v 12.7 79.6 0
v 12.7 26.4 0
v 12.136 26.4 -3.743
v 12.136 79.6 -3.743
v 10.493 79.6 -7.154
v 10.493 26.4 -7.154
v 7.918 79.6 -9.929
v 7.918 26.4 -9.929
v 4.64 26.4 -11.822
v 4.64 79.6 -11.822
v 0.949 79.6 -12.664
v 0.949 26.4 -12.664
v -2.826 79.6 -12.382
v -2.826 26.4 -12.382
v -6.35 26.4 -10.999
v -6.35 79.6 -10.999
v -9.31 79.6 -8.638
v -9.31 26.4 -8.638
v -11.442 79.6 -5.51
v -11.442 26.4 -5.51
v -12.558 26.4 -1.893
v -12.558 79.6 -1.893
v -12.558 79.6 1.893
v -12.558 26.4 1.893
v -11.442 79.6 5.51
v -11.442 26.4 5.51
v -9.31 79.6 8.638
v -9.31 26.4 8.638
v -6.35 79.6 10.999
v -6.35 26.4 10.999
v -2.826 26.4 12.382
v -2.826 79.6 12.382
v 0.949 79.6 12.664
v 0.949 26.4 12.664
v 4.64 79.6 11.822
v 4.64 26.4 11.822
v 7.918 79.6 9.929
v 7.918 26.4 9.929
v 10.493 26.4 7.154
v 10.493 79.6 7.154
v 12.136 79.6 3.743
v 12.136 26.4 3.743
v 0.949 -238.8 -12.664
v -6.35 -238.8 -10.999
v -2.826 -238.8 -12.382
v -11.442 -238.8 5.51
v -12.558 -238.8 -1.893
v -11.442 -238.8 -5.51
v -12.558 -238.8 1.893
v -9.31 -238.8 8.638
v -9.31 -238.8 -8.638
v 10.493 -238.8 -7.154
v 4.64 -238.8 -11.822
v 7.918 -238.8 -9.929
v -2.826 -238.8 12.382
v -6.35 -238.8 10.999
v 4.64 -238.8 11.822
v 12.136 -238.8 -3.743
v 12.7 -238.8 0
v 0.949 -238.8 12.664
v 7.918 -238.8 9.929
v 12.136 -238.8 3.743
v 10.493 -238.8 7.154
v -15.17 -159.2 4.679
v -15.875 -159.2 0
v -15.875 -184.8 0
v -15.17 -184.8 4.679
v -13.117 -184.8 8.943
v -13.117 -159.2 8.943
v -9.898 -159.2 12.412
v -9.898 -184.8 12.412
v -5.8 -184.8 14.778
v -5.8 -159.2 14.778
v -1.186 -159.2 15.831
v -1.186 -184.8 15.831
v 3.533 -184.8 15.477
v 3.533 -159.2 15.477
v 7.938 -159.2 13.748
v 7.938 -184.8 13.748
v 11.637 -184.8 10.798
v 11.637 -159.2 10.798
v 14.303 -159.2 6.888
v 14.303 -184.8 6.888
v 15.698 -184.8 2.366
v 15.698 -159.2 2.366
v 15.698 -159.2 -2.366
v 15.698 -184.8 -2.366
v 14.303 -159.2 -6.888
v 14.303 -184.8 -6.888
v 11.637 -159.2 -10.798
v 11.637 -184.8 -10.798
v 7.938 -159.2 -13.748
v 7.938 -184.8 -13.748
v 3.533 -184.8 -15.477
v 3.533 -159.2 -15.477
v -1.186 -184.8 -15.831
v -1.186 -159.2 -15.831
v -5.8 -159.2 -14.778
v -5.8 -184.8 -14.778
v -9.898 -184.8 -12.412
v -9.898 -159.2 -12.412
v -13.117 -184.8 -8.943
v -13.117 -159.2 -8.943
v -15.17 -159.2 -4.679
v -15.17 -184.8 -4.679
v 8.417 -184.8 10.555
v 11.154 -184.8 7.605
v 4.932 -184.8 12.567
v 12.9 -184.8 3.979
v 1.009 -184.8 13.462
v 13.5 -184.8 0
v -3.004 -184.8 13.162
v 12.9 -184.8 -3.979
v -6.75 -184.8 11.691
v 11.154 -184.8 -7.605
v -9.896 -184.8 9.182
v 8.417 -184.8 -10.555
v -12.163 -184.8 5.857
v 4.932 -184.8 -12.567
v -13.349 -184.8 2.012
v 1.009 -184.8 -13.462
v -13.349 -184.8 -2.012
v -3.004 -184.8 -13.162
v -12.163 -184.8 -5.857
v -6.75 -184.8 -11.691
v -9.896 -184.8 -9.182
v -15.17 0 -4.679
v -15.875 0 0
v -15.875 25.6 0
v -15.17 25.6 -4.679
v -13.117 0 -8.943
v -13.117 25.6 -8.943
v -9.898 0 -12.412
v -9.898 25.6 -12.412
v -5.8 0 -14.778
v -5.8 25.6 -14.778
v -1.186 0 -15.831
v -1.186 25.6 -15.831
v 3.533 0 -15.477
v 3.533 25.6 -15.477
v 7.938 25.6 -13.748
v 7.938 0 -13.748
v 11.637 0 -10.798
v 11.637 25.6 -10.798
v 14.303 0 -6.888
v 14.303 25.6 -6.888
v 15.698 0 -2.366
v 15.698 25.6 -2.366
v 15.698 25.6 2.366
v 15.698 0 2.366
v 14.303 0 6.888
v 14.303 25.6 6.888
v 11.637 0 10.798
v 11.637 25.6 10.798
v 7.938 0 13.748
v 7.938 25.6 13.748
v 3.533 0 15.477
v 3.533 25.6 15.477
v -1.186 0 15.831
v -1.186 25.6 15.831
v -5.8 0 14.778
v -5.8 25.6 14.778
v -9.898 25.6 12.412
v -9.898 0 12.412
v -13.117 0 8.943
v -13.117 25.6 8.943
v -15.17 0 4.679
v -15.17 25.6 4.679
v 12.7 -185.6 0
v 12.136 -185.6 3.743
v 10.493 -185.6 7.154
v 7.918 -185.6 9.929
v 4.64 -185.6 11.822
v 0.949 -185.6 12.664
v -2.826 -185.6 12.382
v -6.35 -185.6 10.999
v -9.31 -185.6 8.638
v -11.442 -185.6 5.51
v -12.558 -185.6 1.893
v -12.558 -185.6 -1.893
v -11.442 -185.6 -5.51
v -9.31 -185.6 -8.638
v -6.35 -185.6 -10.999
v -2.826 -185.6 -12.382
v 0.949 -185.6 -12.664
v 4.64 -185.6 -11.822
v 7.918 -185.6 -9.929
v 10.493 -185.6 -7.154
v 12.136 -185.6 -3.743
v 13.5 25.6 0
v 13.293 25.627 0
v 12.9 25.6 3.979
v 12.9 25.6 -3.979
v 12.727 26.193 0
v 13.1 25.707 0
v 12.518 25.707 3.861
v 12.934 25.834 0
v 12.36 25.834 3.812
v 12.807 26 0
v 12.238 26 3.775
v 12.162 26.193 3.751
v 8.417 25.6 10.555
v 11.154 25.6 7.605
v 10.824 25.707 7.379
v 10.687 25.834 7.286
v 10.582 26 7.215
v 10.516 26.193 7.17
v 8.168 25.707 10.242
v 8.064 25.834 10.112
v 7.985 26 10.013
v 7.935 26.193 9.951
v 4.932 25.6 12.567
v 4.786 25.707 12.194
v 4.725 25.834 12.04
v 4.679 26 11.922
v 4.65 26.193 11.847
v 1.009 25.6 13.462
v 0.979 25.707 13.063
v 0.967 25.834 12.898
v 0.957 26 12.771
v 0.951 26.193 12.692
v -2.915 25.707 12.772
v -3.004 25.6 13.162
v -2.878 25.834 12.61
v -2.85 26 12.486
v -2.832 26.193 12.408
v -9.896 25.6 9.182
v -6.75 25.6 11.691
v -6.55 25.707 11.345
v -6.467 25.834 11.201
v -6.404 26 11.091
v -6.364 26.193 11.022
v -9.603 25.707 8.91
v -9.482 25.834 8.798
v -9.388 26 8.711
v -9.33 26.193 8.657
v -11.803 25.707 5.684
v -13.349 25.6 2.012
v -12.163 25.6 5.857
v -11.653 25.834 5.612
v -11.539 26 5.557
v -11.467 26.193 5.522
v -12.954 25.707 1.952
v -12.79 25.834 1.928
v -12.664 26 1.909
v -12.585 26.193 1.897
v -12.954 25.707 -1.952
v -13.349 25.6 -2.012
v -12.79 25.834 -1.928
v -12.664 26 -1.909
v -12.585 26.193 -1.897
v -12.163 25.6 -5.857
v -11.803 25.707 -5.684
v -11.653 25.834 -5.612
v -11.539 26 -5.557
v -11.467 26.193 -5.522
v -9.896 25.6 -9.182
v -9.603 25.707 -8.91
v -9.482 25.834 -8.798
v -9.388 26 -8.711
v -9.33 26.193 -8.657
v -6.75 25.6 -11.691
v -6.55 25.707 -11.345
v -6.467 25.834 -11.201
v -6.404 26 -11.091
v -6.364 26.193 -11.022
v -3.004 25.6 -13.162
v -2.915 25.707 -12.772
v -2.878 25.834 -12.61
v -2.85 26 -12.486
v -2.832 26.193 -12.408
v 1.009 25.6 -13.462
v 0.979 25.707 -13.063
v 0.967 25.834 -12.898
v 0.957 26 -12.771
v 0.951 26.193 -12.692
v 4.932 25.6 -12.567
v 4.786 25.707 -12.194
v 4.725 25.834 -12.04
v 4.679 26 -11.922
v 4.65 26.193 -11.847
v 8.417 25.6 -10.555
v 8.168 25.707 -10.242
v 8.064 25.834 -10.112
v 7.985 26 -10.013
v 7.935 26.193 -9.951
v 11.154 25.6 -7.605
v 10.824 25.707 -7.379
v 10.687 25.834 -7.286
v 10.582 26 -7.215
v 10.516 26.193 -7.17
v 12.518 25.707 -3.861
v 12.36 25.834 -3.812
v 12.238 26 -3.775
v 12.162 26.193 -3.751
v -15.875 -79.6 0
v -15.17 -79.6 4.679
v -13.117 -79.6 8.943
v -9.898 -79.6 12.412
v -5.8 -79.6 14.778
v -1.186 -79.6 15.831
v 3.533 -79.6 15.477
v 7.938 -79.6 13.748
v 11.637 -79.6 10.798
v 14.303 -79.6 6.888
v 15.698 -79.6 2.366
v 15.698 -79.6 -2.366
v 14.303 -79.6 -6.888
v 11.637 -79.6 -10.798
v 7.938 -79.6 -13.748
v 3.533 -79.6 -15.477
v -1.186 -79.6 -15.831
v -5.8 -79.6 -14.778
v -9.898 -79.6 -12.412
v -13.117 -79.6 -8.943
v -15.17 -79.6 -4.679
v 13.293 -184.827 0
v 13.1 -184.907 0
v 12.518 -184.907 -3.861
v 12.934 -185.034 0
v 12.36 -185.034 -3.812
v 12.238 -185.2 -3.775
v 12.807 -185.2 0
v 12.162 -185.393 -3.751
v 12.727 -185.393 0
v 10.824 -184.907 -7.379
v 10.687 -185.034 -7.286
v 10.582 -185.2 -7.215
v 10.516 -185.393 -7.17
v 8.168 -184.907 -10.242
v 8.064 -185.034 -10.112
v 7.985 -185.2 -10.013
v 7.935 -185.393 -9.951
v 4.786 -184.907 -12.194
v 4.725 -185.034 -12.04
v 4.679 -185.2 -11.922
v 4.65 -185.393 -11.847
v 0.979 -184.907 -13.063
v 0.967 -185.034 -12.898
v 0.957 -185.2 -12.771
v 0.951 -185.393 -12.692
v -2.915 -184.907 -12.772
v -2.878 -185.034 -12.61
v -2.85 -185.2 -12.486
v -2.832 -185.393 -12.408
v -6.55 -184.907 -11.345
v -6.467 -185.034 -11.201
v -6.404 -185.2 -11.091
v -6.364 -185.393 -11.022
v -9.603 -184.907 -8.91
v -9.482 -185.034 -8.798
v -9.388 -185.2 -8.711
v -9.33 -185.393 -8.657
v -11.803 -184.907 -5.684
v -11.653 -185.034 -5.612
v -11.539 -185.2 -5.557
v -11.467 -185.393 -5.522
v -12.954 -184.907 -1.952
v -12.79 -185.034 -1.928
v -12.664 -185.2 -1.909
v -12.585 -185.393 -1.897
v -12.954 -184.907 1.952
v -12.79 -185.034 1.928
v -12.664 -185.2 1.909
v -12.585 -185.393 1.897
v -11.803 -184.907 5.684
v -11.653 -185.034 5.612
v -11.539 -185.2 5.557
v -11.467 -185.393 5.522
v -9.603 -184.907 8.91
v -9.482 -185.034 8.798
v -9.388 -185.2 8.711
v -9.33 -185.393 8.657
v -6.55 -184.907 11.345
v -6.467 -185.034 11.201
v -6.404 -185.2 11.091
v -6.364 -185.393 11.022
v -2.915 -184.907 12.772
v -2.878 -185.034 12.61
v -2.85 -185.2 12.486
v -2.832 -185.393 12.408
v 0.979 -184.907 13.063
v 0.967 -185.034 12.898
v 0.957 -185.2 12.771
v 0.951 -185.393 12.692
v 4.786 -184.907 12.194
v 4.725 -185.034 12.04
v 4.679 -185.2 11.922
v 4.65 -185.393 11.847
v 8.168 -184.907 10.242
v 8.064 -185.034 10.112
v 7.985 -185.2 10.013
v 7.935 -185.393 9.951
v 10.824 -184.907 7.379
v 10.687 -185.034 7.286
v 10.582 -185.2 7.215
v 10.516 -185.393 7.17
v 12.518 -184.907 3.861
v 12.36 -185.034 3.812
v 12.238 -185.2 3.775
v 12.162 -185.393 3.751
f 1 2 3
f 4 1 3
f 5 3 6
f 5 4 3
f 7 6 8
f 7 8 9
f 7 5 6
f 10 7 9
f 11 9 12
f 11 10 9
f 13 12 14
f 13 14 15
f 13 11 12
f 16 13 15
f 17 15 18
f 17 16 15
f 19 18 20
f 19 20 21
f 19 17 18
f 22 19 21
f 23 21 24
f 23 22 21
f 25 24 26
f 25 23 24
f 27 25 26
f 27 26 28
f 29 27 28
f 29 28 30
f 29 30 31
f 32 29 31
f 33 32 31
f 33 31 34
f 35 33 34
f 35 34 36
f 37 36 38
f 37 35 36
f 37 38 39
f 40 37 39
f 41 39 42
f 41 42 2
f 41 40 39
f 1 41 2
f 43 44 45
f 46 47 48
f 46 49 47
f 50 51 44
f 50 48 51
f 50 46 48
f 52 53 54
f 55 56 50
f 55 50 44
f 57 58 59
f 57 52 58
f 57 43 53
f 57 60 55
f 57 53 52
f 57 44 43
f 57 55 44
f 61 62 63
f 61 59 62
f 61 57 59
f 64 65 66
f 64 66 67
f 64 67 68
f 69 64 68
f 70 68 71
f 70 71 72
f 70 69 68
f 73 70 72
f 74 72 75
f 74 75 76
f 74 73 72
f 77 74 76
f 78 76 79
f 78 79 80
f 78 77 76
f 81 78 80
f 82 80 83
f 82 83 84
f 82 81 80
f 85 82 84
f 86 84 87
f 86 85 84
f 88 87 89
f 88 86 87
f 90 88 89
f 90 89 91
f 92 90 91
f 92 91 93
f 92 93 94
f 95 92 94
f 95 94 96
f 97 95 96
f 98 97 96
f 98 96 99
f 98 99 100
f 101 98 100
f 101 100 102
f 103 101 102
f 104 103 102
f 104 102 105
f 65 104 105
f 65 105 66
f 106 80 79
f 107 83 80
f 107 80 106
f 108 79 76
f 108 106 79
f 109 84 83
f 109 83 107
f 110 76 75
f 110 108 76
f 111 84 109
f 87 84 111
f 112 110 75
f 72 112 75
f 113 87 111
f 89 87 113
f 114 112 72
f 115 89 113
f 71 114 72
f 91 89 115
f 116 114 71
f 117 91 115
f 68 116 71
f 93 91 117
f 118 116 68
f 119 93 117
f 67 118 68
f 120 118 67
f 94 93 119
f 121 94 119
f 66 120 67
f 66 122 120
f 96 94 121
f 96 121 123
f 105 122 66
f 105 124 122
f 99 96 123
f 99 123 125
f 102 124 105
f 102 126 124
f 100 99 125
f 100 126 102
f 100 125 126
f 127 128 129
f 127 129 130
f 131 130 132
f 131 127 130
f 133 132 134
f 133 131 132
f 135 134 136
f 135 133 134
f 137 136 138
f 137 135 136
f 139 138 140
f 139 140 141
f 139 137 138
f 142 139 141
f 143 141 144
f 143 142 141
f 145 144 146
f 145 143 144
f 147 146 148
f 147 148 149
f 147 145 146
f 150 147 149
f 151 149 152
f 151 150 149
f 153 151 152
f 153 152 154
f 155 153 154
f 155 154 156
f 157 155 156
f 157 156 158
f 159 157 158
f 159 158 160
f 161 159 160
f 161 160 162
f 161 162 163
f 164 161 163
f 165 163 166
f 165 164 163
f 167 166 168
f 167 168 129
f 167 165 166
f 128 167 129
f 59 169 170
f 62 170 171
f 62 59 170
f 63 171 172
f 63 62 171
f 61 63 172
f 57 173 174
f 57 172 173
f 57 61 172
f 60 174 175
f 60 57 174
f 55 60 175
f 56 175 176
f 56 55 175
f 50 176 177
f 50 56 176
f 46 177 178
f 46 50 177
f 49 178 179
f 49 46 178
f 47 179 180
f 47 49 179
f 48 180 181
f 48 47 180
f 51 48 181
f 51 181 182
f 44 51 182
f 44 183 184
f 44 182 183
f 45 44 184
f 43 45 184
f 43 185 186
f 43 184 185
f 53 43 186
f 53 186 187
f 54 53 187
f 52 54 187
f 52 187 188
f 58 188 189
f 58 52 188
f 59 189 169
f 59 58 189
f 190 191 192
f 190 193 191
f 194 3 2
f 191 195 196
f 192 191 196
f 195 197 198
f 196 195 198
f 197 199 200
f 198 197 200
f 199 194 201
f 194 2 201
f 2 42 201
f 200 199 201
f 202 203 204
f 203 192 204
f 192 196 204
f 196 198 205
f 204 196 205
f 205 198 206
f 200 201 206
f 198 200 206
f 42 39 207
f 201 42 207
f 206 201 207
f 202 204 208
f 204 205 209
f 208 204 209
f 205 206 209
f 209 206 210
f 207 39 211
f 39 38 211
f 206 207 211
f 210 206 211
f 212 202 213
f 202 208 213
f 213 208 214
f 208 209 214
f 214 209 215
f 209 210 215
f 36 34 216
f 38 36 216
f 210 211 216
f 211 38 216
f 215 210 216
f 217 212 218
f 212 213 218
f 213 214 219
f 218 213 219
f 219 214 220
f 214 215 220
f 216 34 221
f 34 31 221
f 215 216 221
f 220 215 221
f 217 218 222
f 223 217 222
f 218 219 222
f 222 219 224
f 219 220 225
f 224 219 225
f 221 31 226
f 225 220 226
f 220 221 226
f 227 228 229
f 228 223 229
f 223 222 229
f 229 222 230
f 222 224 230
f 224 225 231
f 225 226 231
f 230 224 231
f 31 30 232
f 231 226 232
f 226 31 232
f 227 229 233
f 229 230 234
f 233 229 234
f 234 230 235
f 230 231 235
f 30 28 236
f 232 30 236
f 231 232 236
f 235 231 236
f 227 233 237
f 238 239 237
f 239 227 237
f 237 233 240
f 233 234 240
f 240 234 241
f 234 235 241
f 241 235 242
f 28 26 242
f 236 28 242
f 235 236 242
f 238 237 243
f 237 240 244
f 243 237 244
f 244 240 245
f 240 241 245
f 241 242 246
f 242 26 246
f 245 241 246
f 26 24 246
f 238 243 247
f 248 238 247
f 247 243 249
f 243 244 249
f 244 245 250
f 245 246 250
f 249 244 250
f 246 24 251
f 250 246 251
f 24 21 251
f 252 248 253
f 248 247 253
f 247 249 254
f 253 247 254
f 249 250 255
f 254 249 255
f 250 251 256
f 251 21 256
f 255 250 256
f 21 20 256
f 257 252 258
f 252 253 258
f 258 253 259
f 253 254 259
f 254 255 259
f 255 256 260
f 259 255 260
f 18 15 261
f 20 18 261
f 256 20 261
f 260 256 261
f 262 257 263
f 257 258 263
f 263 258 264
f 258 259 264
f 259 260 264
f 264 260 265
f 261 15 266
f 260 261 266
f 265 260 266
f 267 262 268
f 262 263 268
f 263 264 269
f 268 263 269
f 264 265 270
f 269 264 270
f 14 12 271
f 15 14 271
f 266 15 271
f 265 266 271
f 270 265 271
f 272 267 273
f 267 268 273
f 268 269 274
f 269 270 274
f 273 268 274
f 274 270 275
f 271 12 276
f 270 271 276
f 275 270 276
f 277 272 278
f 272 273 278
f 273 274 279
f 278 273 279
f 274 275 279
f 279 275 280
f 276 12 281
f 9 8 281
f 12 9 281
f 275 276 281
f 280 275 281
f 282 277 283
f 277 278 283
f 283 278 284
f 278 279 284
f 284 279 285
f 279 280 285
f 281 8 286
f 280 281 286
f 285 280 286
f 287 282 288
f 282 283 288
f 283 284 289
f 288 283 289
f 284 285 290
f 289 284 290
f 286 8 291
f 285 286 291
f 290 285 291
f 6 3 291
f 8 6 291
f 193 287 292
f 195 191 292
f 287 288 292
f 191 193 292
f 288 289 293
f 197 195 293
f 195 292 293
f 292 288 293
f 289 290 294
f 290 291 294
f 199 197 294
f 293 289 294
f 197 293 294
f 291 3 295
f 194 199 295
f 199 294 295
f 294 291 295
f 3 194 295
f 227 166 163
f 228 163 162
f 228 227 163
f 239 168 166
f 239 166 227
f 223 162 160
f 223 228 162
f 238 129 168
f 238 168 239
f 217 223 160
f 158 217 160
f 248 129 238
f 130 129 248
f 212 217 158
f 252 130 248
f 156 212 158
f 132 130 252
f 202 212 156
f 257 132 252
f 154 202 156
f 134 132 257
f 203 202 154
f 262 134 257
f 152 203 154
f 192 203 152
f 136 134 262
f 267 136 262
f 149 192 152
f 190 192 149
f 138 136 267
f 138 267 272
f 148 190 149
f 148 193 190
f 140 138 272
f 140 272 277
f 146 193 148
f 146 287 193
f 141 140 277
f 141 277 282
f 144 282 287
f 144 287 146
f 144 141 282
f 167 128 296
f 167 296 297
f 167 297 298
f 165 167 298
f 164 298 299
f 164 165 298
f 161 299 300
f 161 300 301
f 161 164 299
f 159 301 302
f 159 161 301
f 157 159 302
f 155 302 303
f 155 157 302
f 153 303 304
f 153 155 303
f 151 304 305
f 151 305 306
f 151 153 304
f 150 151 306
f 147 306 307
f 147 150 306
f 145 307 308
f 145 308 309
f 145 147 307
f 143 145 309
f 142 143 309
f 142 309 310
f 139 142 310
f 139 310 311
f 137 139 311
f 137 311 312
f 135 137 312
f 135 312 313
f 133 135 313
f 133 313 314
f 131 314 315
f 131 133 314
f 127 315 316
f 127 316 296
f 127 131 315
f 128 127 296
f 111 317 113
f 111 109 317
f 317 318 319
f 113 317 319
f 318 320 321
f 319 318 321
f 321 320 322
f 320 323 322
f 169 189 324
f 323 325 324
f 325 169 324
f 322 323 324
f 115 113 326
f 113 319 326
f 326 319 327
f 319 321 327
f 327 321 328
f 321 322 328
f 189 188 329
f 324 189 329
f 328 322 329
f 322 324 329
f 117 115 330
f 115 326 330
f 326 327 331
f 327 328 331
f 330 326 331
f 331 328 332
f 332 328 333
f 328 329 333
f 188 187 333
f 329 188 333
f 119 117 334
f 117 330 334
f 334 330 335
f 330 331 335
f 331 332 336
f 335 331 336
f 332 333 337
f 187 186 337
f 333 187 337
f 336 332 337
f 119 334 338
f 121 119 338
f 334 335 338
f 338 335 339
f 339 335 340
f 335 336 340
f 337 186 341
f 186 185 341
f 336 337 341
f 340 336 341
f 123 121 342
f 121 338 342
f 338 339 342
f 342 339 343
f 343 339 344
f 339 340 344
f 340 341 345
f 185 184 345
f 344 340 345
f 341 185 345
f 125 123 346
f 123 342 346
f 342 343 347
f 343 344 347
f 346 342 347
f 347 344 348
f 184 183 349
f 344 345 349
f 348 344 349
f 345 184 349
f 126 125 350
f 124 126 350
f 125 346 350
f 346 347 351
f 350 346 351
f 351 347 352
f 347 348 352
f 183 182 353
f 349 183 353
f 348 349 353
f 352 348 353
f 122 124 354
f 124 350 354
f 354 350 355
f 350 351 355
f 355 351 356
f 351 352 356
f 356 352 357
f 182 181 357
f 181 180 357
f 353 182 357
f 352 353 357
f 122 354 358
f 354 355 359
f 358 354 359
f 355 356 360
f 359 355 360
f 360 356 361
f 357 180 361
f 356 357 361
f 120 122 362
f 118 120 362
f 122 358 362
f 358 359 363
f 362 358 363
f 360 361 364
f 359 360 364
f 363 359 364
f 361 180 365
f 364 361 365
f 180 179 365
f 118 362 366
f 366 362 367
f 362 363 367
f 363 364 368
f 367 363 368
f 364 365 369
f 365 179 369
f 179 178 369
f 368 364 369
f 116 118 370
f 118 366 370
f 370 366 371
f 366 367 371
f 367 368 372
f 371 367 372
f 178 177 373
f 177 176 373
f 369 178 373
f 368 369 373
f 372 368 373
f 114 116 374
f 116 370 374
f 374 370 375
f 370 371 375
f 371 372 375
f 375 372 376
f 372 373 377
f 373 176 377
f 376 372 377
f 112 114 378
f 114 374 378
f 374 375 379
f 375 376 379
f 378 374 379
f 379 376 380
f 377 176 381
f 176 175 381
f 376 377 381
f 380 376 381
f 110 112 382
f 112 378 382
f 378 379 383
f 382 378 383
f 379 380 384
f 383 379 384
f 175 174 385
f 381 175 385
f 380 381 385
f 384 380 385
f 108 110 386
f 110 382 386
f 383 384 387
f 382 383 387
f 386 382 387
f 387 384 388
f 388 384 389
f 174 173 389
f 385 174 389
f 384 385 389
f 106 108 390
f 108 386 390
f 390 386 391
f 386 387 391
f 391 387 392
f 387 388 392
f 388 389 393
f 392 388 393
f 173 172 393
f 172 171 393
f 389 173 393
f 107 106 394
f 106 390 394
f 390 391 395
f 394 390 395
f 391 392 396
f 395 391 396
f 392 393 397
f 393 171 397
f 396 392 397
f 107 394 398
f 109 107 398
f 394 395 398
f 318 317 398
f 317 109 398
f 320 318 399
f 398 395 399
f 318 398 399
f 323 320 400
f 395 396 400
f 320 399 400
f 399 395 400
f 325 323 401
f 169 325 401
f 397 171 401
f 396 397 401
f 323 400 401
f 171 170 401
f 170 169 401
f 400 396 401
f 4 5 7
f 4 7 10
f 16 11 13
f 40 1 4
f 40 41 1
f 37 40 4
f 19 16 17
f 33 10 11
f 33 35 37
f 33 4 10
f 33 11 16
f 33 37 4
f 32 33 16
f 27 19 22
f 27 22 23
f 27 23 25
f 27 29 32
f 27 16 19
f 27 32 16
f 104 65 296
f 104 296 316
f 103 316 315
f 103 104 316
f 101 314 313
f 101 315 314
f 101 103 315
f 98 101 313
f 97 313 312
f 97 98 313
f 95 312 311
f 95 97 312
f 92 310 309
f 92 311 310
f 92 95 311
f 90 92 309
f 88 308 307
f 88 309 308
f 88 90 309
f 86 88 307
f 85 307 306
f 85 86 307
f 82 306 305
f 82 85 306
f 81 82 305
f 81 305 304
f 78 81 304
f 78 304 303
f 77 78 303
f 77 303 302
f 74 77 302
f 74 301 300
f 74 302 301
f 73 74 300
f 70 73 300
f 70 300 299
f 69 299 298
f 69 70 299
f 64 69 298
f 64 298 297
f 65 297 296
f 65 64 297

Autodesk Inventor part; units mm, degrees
ref_plane "YZ Plane" through (0, 0, 0) normal (1, 0, 0) x (0, 1, 0)
ref_plane "XZ Plane" through (0, 0, 0) normal (0, 1, 0) x (-1, 0, 0)
ref_plane "XY Plane" through (0, 0, 0) normal (0, 0, 1) x (1, 0, 0)
sketch "Sketch1" plane through (0, 0, 0) normal (0, 1, 0) x (-1, 0, 0)
  circle A0 centre (0, 0) radius 15.875
  dimension "d7" = 31.75
extrude "Extrusion1" add sketch "Sketch1" along normal mid plane 159.2
sketch "Sketch2" plane through (0, 79.6, 0) normal (0, 1, 0) x (1, 0, 0)
  circle A0 centre (0, 0) radius 12.7
  circle A1 centre (0, 0) radius 15.875 projected
  circle A2 centre (0, 0) radius 15.875
  dimension "d6" = 25.4
extrude "Extrusion2" cut sketch "Sketch2" against normal blind 54
fillet "Fillet1" radius 0.8 1 edges at (-12.7, 25.6, 0)
mirror "Mirror2" about plane through (0, -79.6, 0) normal (0, -1, 0) of "Extrusion2", "Extrusion1", "Fillet1"
properties part number "Eje Biela"
